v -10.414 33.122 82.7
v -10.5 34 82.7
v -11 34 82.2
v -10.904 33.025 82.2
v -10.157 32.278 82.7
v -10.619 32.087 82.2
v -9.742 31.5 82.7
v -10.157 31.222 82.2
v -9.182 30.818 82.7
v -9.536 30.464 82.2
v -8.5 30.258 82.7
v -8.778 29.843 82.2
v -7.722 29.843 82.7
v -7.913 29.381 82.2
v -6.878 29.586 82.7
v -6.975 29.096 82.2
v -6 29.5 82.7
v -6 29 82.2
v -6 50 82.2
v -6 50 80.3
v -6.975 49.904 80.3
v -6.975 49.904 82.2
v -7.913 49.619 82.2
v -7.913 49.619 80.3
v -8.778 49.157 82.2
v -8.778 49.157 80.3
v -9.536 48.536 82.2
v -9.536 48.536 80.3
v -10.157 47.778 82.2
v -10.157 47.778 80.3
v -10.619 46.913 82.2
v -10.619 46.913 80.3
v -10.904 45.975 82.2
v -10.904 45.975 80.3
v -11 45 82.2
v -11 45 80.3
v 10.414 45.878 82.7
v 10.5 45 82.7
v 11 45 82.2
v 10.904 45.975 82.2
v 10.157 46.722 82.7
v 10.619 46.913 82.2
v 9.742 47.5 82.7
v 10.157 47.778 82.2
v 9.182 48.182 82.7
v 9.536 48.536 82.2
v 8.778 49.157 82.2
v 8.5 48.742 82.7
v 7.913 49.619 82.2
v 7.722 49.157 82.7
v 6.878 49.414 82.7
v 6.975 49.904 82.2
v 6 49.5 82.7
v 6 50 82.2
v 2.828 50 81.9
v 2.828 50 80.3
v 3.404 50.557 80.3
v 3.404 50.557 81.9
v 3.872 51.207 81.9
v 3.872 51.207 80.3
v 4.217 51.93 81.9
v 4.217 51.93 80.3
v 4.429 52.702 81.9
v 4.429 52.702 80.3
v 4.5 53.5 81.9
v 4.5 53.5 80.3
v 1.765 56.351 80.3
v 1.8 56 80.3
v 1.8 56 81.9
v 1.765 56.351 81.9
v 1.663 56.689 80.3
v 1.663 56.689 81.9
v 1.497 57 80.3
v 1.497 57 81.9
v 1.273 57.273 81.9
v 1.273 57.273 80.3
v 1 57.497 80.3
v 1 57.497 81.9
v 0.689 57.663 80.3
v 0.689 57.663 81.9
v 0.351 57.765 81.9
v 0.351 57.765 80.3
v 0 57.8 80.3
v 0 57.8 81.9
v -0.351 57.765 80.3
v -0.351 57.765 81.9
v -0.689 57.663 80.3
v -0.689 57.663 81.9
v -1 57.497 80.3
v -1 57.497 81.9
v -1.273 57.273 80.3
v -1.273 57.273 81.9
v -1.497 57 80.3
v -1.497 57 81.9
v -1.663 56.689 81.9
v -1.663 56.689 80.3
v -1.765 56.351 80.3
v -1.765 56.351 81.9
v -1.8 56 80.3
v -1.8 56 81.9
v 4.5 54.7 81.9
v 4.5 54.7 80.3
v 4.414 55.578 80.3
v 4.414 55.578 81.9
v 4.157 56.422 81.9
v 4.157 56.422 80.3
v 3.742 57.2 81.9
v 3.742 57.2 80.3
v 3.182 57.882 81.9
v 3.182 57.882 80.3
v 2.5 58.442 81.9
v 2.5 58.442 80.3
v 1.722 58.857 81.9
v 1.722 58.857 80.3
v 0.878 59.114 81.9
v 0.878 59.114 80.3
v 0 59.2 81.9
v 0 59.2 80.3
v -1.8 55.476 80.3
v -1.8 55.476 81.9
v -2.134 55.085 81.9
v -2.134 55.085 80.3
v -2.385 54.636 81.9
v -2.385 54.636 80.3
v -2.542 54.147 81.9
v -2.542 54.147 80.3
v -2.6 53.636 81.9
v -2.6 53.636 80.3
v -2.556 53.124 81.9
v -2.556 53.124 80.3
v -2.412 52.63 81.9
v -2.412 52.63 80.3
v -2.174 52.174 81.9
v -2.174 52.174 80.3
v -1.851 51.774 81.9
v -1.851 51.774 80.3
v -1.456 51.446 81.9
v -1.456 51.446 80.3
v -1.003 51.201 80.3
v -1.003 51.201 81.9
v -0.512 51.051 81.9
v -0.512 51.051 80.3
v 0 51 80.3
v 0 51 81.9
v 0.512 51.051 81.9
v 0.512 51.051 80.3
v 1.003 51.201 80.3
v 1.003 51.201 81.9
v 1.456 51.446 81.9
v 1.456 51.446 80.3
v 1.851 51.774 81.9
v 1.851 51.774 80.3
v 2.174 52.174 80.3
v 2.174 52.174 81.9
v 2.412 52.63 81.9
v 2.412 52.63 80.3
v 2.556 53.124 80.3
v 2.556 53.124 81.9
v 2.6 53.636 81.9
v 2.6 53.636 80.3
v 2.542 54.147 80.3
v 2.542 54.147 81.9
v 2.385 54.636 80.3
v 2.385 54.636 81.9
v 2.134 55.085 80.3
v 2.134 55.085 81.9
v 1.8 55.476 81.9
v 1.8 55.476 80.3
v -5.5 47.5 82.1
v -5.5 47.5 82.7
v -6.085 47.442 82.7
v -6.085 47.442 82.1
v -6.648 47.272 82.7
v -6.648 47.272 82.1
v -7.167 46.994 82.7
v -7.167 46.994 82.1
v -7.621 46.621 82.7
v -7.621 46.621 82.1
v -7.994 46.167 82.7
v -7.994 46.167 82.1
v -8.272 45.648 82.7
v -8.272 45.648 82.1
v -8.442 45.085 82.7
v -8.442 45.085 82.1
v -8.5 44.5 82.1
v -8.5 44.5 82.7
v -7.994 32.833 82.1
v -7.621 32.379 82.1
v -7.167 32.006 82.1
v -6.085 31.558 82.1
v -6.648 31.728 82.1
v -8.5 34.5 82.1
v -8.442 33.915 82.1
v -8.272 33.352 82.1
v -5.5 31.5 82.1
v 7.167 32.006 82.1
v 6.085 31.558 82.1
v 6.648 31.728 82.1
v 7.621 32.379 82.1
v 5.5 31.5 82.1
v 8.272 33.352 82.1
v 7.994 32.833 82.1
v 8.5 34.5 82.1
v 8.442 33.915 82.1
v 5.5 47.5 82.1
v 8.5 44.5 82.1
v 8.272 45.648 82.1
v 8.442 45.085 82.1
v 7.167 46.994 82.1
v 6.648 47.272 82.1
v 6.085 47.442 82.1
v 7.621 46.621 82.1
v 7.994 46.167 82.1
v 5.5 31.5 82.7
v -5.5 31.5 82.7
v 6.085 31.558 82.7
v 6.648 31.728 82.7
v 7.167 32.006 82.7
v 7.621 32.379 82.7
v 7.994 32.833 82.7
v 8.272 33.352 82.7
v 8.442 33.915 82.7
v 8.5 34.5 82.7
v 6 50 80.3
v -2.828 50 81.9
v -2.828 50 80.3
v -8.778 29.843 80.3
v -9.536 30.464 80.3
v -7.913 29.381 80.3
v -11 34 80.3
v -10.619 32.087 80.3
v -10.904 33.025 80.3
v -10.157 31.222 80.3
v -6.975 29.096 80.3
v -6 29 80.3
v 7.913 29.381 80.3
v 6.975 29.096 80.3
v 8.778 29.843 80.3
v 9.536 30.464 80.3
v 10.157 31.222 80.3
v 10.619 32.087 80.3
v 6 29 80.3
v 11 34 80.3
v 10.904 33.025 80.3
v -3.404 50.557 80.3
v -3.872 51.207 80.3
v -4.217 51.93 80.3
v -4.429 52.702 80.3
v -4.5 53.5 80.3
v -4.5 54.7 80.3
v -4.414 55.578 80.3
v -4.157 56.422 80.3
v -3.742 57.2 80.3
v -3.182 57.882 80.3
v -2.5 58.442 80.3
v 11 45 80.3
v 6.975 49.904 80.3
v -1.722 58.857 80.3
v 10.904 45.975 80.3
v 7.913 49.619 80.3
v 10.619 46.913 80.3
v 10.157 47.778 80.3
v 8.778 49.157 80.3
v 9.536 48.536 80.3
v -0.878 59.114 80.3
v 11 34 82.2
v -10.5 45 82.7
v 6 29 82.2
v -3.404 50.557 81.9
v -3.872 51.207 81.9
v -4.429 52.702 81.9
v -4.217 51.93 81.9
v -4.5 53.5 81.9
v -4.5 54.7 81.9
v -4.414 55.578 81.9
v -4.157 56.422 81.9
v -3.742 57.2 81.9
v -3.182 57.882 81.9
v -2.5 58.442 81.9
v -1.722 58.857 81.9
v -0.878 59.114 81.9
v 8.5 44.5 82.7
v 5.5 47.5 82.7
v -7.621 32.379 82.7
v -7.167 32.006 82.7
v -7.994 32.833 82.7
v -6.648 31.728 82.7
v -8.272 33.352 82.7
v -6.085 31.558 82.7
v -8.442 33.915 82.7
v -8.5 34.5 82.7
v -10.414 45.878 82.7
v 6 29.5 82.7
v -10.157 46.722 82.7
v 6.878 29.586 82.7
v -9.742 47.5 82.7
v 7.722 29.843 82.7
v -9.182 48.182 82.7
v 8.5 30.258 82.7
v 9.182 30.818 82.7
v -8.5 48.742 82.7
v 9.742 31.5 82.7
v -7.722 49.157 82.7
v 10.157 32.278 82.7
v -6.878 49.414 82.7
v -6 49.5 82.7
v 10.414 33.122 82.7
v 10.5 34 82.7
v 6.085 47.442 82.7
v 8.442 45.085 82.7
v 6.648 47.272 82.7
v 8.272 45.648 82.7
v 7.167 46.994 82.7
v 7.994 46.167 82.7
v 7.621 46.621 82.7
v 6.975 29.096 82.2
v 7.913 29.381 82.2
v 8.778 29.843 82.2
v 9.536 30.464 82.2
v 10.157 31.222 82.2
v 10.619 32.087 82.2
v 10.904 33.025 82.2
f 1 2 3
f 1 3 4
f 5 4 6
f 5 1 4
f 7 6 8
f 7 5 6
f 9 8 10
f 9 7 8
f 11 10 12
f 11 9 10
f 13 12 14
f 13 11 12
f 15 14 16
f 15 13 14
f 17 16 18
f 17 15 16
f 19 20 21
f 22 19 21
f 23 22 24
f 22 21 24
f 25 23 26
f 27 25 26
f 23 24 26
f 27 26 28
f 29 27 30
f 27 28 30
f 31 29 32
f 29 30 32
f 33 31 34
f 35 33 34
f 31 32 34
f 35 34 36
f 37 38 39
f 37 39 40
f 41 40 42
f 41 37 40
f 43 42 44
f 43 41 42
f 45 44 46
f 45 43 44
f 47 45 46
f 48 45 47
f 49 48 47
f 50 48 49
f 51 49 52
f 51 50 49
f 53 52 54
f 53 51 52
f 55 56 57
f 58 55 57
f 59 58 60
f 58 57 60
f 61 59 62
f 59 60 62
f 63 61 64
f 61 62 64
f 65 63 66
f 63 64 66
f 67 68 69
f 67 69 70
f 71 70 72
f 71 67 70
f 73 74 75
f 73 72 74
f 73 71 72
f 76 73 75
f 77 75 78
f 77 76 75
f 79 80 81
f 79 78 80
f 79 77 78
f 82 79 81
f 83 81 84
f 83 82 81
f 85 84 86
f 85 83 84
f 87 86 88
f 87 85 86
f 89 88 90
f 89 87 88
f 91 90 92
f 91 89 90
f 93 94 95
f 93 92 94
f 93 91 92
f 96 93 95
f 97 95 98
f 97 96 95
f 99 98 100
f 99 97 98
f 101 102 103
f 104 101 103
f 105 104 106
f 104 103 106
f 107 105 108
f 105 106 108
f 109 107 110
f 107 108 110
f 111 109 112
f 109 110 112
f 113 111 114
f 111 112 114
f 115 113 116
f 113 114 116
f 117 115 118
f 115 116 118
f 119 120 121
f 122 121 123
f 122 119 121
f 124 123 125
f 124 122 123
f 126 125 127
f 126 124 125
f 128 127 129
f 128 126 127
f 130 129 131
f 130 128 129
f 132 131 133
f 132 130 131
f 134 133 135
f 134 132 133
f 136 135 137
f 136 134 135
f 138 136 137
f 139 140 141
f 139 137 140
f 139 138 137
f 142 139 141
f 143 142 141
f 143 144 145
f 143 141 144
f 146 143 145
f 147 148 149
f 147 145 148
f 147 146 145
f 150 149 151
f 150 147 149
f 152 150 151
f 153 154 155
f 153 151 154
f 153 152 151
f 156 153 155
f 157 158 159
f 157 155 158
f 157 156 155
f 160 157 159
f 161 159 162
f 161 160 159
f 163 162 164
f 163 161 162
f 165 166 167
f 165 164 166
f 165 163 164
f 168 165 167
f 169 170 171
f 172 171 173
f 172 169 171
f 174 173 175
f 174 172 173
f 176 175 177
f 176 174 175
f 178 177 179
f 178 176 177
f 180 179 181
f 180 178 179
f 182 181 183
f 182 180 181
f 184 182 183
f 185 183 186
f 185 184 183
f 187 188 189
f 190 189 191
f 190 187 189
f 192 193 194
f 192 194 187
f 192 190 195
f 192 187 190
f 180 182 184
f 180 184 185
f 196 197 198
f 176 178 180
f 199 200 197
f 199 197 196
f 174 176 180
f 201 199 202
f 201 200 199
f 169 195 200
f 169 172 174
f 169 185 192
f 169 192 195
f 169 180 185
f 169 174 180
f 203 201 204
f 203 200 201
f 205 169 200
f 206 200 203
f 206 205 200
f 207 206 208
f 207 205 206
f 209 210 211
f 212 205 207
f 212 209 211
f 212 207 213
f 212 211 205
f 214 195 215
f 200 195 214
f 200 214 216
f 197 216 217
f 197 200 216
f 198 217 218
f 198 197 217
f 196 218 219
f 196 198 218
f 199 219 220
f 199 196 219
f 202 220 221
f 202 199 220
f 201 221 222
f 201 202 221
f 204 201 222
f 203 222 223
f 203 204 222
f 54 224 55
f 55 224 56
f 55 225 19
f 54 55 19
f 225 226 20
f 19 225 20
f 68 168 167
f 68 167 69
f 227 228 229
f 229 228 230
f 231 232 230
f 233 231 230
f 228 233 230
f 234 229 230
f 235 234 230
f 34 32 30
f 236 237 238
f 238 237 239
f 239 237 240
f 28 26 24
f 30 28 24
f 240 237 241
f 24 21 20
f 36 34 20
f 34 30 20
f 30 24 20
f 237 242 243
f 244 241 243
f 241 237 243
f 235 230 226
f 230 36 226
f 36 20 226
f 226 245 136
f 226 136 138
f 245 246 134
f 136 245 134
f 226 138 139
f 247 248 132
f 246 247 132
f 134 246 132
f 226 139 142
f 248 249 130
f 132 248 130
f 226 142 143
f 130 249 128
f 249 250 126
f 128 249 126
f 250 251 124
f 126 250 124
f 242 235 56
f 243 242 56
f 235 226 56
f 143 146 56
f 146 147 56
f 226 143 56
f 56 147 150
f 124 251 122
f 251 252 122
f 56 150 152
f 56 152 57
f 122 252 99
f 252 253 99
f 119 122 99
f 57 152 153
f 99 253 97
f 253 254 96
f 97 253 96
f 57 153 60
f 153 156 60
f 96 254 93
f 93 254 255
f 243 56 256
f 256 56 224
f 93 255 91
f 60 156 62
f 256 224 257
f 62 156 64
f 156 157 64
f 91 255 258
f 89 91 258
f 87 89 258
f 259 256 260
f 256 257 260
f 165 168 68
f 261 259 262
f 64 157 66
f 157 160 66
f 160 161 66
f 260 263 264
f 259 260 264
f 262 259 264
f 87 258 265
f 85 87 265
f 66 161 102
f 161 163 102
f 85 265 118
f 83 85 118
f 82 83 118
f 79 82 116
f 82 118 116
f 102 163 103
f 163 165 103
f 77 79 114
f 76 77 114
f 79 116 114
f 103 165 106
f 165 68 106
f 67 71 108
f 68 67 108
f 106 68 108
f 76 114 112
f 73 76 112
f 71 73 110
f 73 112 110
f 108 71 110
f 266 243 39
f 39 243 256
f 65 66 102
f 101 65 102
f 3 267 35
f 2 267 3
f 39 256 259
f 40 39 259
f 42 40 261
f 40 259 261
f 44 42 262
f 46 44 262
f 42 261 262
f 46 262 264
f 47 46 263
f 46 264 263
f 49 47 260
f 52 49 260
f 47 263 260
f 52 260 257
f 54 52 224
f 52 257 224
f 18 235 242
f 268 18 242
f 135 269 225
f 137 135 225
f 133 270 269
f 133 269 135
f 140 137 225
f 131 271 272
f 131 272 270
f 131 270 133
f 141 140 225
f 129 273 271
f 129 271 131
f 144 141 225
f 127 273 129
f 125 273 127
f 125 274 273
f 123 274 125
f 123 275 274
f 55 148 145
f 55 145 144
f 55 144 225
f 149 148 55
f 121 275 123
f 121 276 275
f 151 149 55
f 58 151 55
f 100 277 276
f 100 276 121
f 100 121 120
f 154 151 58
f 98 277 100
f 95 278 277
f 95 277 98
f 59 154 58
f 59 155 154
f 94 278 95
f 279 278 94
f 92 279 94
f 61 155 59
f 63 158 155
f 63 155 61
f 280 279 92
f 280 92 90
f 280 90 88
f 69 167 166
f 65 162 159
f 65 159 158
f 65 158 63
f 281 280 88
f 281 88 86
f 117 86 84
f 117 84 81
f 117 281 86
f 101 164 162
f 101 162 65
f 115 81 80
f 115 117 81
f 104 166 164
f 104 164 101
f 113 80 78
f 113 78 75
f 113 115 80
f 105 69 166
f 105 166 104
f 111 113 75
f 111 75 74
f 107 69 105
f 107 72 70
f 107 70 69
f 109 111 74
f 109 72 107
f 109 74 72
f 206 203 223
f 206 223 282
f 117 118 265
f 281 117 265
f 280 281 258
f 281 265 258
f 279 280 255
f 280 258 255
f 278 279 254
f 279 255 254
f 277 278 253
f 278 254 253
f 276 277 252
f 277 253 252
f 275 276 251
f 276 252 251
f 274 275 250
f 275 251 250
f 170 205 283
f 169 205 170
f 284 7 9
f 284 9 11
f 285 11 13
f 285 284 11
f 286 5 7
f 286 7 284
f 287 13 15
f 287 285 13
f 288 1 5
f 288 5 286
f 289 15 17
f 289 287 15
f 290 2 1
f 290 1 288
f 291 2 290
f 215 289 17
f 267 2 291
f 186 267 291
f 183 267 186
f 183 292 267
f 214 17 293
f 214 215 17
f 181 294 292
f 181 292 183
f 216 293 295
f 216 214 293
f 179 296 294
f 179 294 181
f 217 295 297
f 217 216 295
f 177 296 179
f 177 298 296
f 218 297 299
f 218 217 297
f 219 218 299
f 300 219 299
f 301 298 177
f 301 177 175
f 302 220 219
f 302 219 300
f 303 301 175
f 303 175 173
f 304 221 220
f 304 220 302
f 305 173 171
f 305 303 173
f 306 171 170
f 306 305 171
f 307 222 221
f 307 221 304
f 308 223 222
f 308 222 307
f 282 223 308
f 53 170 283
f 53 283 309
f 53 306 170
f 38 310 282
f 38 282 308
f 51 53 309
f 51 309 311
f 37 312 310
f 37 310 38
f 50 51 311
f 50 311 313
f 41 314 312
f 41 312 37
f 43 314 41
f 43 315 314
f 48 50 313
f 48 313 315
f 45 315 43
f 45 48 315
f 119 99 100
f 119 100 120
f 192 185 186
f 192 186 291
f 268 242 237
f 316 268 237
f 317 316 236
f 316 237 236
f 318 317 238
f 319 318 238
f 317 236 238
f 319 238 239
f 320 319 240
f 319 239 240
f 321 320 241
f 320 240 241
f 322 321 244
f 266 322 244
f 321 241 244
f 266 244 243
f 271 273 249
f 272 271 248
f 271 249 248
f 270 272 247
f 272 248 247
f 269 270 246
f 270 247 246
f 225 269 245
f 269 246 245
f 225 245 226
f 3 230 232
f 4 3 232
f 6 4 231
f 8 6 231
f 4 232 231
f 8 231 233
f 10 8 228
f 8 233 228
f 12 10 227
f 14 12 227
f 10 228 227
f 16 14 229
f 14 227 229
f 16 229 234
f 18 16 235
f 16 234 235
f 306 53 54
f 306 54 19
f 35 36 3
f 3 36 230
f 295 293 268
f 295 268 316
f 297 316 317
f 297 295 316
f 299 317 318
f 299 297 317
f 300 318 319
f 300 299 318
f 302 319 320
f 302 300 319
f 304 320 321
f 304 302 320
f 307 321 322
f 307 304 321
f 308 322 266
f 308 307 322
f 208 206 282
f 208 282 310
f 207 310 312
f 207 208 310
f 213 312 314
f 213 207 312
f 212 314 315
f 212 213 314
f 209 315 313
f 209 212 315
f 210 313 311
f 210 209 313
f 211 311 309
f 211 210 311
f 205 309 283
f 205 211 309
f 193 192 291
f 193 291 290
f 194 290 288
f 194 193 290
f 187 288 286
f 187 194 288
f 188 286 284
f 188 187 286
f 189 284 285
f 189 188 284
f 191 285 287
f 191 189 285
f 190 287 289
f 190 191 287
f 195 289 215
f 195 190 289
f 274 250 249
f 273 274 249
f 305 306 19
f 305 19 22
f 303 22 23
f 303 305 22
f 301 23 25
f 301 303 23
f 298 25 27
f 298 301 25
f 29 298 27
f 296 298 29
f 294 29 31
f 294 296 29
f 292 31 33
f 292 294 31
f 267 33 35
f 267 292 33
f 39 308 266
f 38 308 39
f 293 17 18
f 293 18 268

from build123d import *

# Parameters (mm, degrees)
BOSS_EXTRUDE1_START = 80.3
BOSS_EXTRUDE1_DEPTH = 2.4
BOSS_EXTRUDE2_START = 80.3
BOSS_EXTRUDE2_DEPTH = 1.6
BOSS_EXTRUDE3_START = 79.3
BOSS_EXTRUDE3_DEPTH = 4.4
BOSS_EXTRUDE4_START = 79.3
SKETCH4_R           = 2.6
BOSS_EXTRUDE4_DEPTH = 4.4
BOSS_EXTRUDE5_START = 82.1
BOSS_EXTRUDE5_DEPTH = 1.6
CHAMFER1_SIZE       = 0.5


with BuildPart() as part:
    # Sketch1 → Boss-Extrude1 (new body)
    with BuildSketch(Plane.XY.offset(BOSS_EXTRUDE1_START)):
        with BuildLine():
            Line((-6, 29), (6, 29))
            ThreePointArc((6, 29), (9.535533906, 30.464466094), (11, 34))
            Line((11, 34), (11, 45))
            ThreePointArc((11, 45), (9.535533906, 48.535533906), (6, 50))
            Line((6, 50), (-6, 50))
            ThreePointArc((-6, 50), (-9.535533906, 48.535533906), (-11, 45))
            Line((-11, 45), (-11, 34))
            ThreePointArc((-11, 34), (-9.535533906, 30.464466094), (-6, 29))
        make_face()
    extrude(amount=BOSS_EXTRUDE1_DEPTH)

    # Sketch2 → Boss-Extrude2 (add)
    with BuildSketch(Plane.XY.offset(BOSS_EXTRUDE2_START)):
        with BuildLine():
            Line((4.5, 53.5), (4.5, 54.7))
            ThreePointArc((4.5, 54.7), (3.181980515, 57.881980515), (0, 59.2))
            ThreePointArc((0, 59.2), (-3.181980515, 57.881980515), (-4.5, 54.7))
            Line((-4.5, 54.7), (-4.5, 53.5))
            ThreePointArc((-4.5, 53.5), (-3.181980515, 50.318019485), (0, 49))
            ThreePointArc((0, 49), (3.181980515, 50.318019485), (4.5, 53.5))
        make_face()
    extrude(amount=BOSS_EXTRUDE2_DEPTH)


with BuildPart() as body_2:
    # Sketch3 → Boss-Extrude3 (new body)
    with BuildSketch(Plane.XY.offset(BOSS_EXTRUDE3_START)):
        with BuildLine():
            Line((-1.8, 56), (-1.8, 53.6))
            ThreePointArc((-1.8, 53.6), (0, 51.8), (1.8, 53.6))
            Line((1.8, 53.6), (1.8, 56))
            ThreePointArc((1.8, 56), (0, 57.8), (-1.8, 56))
        make_face()
    extrude(amount=BOSS_EXTRUDE3_DEPTH)


with BuildPart() as part_1:
    add(part.part)

    # Combine1: cut body 2
    add(body_2.part, mode=Mode.SUBTRACT)


with BuildPart() as body_2_2:
    # Sketch4 → Boss-Extrude4 (new body)
    with BuildSketch(Plane.XY.offset(BOSS_EXTRUDE4_START)):
        with Locations((0, 53.6)):
            Circle(SKETCH4_R)
    extrude(amount=BOSS_EXTRUDE4_DEPTH)


with BuildPart() as part_2:
    add(part_1.part)

    # Combine2: cut body 2 2
    add(body_2_2.part, mode=Mode.SUBTRACT)


with BuildPart() as body_2_3:
    # Sketch5 → Boss-Extrude5 (new body)
    with BuildSketch(Plane.XY.offset(BOSS_EXTRUDE5_START)):
        with BuildLine():
            Line((-5.5, 31.5), (5.5, 31.5))
            ThreePointArc((5.5, 31.5), (7.621320344, 32.378679656), (8.5, 34.5))
            Line((8.5, 34.5), (8.5, 44.5))
            ThreePointArc((8.5, 44.5), (7.621320344, 46.621320344), (5.5, 47.5))
            Line((5.5, 47.5), (-5.5, 47.5))
            ThreePointArc((-5.5, 47.5), (-7.621320344, 46.621320344), (-8.5, 44.5))
            Line((-8.5, 44.5), (-8.5, 34.5))
            ThreePointArc((-8.5, 34.5), (-7.621320344, 32.378679656), (-5.5, 31.5))
        make_face()
    extrude(amount=BOSS_EXTRUDE5_DEPTH)


with BuildPart() as part_3:
    add(part_2.part)

    # Combine3: cut body 2 3
    add(body_2_3.part, mode=Mode.SUBTRACT)

    # Chamfer1
    chamfer1_edges = [part_3.edges().sort_by_distance(p)[0] for p in [
        (9.535533906, 30.464466094, 82.7),
        (11, 39.5, 82.7),
        (9.535533906, 48.535533906, 82.7),
        (0, 50, 82.7),
        (-9.535533906, 48.535533906, 82.7),
        (-11, 39.5, 82.7),
        (-9.535533906, 30.464466094, 82.7),
        (0, 29, 82.7),
    ]]
    chamfer(chamfer1_edges, length=CHAMFER1_SIZE)


solid = part_3.part
